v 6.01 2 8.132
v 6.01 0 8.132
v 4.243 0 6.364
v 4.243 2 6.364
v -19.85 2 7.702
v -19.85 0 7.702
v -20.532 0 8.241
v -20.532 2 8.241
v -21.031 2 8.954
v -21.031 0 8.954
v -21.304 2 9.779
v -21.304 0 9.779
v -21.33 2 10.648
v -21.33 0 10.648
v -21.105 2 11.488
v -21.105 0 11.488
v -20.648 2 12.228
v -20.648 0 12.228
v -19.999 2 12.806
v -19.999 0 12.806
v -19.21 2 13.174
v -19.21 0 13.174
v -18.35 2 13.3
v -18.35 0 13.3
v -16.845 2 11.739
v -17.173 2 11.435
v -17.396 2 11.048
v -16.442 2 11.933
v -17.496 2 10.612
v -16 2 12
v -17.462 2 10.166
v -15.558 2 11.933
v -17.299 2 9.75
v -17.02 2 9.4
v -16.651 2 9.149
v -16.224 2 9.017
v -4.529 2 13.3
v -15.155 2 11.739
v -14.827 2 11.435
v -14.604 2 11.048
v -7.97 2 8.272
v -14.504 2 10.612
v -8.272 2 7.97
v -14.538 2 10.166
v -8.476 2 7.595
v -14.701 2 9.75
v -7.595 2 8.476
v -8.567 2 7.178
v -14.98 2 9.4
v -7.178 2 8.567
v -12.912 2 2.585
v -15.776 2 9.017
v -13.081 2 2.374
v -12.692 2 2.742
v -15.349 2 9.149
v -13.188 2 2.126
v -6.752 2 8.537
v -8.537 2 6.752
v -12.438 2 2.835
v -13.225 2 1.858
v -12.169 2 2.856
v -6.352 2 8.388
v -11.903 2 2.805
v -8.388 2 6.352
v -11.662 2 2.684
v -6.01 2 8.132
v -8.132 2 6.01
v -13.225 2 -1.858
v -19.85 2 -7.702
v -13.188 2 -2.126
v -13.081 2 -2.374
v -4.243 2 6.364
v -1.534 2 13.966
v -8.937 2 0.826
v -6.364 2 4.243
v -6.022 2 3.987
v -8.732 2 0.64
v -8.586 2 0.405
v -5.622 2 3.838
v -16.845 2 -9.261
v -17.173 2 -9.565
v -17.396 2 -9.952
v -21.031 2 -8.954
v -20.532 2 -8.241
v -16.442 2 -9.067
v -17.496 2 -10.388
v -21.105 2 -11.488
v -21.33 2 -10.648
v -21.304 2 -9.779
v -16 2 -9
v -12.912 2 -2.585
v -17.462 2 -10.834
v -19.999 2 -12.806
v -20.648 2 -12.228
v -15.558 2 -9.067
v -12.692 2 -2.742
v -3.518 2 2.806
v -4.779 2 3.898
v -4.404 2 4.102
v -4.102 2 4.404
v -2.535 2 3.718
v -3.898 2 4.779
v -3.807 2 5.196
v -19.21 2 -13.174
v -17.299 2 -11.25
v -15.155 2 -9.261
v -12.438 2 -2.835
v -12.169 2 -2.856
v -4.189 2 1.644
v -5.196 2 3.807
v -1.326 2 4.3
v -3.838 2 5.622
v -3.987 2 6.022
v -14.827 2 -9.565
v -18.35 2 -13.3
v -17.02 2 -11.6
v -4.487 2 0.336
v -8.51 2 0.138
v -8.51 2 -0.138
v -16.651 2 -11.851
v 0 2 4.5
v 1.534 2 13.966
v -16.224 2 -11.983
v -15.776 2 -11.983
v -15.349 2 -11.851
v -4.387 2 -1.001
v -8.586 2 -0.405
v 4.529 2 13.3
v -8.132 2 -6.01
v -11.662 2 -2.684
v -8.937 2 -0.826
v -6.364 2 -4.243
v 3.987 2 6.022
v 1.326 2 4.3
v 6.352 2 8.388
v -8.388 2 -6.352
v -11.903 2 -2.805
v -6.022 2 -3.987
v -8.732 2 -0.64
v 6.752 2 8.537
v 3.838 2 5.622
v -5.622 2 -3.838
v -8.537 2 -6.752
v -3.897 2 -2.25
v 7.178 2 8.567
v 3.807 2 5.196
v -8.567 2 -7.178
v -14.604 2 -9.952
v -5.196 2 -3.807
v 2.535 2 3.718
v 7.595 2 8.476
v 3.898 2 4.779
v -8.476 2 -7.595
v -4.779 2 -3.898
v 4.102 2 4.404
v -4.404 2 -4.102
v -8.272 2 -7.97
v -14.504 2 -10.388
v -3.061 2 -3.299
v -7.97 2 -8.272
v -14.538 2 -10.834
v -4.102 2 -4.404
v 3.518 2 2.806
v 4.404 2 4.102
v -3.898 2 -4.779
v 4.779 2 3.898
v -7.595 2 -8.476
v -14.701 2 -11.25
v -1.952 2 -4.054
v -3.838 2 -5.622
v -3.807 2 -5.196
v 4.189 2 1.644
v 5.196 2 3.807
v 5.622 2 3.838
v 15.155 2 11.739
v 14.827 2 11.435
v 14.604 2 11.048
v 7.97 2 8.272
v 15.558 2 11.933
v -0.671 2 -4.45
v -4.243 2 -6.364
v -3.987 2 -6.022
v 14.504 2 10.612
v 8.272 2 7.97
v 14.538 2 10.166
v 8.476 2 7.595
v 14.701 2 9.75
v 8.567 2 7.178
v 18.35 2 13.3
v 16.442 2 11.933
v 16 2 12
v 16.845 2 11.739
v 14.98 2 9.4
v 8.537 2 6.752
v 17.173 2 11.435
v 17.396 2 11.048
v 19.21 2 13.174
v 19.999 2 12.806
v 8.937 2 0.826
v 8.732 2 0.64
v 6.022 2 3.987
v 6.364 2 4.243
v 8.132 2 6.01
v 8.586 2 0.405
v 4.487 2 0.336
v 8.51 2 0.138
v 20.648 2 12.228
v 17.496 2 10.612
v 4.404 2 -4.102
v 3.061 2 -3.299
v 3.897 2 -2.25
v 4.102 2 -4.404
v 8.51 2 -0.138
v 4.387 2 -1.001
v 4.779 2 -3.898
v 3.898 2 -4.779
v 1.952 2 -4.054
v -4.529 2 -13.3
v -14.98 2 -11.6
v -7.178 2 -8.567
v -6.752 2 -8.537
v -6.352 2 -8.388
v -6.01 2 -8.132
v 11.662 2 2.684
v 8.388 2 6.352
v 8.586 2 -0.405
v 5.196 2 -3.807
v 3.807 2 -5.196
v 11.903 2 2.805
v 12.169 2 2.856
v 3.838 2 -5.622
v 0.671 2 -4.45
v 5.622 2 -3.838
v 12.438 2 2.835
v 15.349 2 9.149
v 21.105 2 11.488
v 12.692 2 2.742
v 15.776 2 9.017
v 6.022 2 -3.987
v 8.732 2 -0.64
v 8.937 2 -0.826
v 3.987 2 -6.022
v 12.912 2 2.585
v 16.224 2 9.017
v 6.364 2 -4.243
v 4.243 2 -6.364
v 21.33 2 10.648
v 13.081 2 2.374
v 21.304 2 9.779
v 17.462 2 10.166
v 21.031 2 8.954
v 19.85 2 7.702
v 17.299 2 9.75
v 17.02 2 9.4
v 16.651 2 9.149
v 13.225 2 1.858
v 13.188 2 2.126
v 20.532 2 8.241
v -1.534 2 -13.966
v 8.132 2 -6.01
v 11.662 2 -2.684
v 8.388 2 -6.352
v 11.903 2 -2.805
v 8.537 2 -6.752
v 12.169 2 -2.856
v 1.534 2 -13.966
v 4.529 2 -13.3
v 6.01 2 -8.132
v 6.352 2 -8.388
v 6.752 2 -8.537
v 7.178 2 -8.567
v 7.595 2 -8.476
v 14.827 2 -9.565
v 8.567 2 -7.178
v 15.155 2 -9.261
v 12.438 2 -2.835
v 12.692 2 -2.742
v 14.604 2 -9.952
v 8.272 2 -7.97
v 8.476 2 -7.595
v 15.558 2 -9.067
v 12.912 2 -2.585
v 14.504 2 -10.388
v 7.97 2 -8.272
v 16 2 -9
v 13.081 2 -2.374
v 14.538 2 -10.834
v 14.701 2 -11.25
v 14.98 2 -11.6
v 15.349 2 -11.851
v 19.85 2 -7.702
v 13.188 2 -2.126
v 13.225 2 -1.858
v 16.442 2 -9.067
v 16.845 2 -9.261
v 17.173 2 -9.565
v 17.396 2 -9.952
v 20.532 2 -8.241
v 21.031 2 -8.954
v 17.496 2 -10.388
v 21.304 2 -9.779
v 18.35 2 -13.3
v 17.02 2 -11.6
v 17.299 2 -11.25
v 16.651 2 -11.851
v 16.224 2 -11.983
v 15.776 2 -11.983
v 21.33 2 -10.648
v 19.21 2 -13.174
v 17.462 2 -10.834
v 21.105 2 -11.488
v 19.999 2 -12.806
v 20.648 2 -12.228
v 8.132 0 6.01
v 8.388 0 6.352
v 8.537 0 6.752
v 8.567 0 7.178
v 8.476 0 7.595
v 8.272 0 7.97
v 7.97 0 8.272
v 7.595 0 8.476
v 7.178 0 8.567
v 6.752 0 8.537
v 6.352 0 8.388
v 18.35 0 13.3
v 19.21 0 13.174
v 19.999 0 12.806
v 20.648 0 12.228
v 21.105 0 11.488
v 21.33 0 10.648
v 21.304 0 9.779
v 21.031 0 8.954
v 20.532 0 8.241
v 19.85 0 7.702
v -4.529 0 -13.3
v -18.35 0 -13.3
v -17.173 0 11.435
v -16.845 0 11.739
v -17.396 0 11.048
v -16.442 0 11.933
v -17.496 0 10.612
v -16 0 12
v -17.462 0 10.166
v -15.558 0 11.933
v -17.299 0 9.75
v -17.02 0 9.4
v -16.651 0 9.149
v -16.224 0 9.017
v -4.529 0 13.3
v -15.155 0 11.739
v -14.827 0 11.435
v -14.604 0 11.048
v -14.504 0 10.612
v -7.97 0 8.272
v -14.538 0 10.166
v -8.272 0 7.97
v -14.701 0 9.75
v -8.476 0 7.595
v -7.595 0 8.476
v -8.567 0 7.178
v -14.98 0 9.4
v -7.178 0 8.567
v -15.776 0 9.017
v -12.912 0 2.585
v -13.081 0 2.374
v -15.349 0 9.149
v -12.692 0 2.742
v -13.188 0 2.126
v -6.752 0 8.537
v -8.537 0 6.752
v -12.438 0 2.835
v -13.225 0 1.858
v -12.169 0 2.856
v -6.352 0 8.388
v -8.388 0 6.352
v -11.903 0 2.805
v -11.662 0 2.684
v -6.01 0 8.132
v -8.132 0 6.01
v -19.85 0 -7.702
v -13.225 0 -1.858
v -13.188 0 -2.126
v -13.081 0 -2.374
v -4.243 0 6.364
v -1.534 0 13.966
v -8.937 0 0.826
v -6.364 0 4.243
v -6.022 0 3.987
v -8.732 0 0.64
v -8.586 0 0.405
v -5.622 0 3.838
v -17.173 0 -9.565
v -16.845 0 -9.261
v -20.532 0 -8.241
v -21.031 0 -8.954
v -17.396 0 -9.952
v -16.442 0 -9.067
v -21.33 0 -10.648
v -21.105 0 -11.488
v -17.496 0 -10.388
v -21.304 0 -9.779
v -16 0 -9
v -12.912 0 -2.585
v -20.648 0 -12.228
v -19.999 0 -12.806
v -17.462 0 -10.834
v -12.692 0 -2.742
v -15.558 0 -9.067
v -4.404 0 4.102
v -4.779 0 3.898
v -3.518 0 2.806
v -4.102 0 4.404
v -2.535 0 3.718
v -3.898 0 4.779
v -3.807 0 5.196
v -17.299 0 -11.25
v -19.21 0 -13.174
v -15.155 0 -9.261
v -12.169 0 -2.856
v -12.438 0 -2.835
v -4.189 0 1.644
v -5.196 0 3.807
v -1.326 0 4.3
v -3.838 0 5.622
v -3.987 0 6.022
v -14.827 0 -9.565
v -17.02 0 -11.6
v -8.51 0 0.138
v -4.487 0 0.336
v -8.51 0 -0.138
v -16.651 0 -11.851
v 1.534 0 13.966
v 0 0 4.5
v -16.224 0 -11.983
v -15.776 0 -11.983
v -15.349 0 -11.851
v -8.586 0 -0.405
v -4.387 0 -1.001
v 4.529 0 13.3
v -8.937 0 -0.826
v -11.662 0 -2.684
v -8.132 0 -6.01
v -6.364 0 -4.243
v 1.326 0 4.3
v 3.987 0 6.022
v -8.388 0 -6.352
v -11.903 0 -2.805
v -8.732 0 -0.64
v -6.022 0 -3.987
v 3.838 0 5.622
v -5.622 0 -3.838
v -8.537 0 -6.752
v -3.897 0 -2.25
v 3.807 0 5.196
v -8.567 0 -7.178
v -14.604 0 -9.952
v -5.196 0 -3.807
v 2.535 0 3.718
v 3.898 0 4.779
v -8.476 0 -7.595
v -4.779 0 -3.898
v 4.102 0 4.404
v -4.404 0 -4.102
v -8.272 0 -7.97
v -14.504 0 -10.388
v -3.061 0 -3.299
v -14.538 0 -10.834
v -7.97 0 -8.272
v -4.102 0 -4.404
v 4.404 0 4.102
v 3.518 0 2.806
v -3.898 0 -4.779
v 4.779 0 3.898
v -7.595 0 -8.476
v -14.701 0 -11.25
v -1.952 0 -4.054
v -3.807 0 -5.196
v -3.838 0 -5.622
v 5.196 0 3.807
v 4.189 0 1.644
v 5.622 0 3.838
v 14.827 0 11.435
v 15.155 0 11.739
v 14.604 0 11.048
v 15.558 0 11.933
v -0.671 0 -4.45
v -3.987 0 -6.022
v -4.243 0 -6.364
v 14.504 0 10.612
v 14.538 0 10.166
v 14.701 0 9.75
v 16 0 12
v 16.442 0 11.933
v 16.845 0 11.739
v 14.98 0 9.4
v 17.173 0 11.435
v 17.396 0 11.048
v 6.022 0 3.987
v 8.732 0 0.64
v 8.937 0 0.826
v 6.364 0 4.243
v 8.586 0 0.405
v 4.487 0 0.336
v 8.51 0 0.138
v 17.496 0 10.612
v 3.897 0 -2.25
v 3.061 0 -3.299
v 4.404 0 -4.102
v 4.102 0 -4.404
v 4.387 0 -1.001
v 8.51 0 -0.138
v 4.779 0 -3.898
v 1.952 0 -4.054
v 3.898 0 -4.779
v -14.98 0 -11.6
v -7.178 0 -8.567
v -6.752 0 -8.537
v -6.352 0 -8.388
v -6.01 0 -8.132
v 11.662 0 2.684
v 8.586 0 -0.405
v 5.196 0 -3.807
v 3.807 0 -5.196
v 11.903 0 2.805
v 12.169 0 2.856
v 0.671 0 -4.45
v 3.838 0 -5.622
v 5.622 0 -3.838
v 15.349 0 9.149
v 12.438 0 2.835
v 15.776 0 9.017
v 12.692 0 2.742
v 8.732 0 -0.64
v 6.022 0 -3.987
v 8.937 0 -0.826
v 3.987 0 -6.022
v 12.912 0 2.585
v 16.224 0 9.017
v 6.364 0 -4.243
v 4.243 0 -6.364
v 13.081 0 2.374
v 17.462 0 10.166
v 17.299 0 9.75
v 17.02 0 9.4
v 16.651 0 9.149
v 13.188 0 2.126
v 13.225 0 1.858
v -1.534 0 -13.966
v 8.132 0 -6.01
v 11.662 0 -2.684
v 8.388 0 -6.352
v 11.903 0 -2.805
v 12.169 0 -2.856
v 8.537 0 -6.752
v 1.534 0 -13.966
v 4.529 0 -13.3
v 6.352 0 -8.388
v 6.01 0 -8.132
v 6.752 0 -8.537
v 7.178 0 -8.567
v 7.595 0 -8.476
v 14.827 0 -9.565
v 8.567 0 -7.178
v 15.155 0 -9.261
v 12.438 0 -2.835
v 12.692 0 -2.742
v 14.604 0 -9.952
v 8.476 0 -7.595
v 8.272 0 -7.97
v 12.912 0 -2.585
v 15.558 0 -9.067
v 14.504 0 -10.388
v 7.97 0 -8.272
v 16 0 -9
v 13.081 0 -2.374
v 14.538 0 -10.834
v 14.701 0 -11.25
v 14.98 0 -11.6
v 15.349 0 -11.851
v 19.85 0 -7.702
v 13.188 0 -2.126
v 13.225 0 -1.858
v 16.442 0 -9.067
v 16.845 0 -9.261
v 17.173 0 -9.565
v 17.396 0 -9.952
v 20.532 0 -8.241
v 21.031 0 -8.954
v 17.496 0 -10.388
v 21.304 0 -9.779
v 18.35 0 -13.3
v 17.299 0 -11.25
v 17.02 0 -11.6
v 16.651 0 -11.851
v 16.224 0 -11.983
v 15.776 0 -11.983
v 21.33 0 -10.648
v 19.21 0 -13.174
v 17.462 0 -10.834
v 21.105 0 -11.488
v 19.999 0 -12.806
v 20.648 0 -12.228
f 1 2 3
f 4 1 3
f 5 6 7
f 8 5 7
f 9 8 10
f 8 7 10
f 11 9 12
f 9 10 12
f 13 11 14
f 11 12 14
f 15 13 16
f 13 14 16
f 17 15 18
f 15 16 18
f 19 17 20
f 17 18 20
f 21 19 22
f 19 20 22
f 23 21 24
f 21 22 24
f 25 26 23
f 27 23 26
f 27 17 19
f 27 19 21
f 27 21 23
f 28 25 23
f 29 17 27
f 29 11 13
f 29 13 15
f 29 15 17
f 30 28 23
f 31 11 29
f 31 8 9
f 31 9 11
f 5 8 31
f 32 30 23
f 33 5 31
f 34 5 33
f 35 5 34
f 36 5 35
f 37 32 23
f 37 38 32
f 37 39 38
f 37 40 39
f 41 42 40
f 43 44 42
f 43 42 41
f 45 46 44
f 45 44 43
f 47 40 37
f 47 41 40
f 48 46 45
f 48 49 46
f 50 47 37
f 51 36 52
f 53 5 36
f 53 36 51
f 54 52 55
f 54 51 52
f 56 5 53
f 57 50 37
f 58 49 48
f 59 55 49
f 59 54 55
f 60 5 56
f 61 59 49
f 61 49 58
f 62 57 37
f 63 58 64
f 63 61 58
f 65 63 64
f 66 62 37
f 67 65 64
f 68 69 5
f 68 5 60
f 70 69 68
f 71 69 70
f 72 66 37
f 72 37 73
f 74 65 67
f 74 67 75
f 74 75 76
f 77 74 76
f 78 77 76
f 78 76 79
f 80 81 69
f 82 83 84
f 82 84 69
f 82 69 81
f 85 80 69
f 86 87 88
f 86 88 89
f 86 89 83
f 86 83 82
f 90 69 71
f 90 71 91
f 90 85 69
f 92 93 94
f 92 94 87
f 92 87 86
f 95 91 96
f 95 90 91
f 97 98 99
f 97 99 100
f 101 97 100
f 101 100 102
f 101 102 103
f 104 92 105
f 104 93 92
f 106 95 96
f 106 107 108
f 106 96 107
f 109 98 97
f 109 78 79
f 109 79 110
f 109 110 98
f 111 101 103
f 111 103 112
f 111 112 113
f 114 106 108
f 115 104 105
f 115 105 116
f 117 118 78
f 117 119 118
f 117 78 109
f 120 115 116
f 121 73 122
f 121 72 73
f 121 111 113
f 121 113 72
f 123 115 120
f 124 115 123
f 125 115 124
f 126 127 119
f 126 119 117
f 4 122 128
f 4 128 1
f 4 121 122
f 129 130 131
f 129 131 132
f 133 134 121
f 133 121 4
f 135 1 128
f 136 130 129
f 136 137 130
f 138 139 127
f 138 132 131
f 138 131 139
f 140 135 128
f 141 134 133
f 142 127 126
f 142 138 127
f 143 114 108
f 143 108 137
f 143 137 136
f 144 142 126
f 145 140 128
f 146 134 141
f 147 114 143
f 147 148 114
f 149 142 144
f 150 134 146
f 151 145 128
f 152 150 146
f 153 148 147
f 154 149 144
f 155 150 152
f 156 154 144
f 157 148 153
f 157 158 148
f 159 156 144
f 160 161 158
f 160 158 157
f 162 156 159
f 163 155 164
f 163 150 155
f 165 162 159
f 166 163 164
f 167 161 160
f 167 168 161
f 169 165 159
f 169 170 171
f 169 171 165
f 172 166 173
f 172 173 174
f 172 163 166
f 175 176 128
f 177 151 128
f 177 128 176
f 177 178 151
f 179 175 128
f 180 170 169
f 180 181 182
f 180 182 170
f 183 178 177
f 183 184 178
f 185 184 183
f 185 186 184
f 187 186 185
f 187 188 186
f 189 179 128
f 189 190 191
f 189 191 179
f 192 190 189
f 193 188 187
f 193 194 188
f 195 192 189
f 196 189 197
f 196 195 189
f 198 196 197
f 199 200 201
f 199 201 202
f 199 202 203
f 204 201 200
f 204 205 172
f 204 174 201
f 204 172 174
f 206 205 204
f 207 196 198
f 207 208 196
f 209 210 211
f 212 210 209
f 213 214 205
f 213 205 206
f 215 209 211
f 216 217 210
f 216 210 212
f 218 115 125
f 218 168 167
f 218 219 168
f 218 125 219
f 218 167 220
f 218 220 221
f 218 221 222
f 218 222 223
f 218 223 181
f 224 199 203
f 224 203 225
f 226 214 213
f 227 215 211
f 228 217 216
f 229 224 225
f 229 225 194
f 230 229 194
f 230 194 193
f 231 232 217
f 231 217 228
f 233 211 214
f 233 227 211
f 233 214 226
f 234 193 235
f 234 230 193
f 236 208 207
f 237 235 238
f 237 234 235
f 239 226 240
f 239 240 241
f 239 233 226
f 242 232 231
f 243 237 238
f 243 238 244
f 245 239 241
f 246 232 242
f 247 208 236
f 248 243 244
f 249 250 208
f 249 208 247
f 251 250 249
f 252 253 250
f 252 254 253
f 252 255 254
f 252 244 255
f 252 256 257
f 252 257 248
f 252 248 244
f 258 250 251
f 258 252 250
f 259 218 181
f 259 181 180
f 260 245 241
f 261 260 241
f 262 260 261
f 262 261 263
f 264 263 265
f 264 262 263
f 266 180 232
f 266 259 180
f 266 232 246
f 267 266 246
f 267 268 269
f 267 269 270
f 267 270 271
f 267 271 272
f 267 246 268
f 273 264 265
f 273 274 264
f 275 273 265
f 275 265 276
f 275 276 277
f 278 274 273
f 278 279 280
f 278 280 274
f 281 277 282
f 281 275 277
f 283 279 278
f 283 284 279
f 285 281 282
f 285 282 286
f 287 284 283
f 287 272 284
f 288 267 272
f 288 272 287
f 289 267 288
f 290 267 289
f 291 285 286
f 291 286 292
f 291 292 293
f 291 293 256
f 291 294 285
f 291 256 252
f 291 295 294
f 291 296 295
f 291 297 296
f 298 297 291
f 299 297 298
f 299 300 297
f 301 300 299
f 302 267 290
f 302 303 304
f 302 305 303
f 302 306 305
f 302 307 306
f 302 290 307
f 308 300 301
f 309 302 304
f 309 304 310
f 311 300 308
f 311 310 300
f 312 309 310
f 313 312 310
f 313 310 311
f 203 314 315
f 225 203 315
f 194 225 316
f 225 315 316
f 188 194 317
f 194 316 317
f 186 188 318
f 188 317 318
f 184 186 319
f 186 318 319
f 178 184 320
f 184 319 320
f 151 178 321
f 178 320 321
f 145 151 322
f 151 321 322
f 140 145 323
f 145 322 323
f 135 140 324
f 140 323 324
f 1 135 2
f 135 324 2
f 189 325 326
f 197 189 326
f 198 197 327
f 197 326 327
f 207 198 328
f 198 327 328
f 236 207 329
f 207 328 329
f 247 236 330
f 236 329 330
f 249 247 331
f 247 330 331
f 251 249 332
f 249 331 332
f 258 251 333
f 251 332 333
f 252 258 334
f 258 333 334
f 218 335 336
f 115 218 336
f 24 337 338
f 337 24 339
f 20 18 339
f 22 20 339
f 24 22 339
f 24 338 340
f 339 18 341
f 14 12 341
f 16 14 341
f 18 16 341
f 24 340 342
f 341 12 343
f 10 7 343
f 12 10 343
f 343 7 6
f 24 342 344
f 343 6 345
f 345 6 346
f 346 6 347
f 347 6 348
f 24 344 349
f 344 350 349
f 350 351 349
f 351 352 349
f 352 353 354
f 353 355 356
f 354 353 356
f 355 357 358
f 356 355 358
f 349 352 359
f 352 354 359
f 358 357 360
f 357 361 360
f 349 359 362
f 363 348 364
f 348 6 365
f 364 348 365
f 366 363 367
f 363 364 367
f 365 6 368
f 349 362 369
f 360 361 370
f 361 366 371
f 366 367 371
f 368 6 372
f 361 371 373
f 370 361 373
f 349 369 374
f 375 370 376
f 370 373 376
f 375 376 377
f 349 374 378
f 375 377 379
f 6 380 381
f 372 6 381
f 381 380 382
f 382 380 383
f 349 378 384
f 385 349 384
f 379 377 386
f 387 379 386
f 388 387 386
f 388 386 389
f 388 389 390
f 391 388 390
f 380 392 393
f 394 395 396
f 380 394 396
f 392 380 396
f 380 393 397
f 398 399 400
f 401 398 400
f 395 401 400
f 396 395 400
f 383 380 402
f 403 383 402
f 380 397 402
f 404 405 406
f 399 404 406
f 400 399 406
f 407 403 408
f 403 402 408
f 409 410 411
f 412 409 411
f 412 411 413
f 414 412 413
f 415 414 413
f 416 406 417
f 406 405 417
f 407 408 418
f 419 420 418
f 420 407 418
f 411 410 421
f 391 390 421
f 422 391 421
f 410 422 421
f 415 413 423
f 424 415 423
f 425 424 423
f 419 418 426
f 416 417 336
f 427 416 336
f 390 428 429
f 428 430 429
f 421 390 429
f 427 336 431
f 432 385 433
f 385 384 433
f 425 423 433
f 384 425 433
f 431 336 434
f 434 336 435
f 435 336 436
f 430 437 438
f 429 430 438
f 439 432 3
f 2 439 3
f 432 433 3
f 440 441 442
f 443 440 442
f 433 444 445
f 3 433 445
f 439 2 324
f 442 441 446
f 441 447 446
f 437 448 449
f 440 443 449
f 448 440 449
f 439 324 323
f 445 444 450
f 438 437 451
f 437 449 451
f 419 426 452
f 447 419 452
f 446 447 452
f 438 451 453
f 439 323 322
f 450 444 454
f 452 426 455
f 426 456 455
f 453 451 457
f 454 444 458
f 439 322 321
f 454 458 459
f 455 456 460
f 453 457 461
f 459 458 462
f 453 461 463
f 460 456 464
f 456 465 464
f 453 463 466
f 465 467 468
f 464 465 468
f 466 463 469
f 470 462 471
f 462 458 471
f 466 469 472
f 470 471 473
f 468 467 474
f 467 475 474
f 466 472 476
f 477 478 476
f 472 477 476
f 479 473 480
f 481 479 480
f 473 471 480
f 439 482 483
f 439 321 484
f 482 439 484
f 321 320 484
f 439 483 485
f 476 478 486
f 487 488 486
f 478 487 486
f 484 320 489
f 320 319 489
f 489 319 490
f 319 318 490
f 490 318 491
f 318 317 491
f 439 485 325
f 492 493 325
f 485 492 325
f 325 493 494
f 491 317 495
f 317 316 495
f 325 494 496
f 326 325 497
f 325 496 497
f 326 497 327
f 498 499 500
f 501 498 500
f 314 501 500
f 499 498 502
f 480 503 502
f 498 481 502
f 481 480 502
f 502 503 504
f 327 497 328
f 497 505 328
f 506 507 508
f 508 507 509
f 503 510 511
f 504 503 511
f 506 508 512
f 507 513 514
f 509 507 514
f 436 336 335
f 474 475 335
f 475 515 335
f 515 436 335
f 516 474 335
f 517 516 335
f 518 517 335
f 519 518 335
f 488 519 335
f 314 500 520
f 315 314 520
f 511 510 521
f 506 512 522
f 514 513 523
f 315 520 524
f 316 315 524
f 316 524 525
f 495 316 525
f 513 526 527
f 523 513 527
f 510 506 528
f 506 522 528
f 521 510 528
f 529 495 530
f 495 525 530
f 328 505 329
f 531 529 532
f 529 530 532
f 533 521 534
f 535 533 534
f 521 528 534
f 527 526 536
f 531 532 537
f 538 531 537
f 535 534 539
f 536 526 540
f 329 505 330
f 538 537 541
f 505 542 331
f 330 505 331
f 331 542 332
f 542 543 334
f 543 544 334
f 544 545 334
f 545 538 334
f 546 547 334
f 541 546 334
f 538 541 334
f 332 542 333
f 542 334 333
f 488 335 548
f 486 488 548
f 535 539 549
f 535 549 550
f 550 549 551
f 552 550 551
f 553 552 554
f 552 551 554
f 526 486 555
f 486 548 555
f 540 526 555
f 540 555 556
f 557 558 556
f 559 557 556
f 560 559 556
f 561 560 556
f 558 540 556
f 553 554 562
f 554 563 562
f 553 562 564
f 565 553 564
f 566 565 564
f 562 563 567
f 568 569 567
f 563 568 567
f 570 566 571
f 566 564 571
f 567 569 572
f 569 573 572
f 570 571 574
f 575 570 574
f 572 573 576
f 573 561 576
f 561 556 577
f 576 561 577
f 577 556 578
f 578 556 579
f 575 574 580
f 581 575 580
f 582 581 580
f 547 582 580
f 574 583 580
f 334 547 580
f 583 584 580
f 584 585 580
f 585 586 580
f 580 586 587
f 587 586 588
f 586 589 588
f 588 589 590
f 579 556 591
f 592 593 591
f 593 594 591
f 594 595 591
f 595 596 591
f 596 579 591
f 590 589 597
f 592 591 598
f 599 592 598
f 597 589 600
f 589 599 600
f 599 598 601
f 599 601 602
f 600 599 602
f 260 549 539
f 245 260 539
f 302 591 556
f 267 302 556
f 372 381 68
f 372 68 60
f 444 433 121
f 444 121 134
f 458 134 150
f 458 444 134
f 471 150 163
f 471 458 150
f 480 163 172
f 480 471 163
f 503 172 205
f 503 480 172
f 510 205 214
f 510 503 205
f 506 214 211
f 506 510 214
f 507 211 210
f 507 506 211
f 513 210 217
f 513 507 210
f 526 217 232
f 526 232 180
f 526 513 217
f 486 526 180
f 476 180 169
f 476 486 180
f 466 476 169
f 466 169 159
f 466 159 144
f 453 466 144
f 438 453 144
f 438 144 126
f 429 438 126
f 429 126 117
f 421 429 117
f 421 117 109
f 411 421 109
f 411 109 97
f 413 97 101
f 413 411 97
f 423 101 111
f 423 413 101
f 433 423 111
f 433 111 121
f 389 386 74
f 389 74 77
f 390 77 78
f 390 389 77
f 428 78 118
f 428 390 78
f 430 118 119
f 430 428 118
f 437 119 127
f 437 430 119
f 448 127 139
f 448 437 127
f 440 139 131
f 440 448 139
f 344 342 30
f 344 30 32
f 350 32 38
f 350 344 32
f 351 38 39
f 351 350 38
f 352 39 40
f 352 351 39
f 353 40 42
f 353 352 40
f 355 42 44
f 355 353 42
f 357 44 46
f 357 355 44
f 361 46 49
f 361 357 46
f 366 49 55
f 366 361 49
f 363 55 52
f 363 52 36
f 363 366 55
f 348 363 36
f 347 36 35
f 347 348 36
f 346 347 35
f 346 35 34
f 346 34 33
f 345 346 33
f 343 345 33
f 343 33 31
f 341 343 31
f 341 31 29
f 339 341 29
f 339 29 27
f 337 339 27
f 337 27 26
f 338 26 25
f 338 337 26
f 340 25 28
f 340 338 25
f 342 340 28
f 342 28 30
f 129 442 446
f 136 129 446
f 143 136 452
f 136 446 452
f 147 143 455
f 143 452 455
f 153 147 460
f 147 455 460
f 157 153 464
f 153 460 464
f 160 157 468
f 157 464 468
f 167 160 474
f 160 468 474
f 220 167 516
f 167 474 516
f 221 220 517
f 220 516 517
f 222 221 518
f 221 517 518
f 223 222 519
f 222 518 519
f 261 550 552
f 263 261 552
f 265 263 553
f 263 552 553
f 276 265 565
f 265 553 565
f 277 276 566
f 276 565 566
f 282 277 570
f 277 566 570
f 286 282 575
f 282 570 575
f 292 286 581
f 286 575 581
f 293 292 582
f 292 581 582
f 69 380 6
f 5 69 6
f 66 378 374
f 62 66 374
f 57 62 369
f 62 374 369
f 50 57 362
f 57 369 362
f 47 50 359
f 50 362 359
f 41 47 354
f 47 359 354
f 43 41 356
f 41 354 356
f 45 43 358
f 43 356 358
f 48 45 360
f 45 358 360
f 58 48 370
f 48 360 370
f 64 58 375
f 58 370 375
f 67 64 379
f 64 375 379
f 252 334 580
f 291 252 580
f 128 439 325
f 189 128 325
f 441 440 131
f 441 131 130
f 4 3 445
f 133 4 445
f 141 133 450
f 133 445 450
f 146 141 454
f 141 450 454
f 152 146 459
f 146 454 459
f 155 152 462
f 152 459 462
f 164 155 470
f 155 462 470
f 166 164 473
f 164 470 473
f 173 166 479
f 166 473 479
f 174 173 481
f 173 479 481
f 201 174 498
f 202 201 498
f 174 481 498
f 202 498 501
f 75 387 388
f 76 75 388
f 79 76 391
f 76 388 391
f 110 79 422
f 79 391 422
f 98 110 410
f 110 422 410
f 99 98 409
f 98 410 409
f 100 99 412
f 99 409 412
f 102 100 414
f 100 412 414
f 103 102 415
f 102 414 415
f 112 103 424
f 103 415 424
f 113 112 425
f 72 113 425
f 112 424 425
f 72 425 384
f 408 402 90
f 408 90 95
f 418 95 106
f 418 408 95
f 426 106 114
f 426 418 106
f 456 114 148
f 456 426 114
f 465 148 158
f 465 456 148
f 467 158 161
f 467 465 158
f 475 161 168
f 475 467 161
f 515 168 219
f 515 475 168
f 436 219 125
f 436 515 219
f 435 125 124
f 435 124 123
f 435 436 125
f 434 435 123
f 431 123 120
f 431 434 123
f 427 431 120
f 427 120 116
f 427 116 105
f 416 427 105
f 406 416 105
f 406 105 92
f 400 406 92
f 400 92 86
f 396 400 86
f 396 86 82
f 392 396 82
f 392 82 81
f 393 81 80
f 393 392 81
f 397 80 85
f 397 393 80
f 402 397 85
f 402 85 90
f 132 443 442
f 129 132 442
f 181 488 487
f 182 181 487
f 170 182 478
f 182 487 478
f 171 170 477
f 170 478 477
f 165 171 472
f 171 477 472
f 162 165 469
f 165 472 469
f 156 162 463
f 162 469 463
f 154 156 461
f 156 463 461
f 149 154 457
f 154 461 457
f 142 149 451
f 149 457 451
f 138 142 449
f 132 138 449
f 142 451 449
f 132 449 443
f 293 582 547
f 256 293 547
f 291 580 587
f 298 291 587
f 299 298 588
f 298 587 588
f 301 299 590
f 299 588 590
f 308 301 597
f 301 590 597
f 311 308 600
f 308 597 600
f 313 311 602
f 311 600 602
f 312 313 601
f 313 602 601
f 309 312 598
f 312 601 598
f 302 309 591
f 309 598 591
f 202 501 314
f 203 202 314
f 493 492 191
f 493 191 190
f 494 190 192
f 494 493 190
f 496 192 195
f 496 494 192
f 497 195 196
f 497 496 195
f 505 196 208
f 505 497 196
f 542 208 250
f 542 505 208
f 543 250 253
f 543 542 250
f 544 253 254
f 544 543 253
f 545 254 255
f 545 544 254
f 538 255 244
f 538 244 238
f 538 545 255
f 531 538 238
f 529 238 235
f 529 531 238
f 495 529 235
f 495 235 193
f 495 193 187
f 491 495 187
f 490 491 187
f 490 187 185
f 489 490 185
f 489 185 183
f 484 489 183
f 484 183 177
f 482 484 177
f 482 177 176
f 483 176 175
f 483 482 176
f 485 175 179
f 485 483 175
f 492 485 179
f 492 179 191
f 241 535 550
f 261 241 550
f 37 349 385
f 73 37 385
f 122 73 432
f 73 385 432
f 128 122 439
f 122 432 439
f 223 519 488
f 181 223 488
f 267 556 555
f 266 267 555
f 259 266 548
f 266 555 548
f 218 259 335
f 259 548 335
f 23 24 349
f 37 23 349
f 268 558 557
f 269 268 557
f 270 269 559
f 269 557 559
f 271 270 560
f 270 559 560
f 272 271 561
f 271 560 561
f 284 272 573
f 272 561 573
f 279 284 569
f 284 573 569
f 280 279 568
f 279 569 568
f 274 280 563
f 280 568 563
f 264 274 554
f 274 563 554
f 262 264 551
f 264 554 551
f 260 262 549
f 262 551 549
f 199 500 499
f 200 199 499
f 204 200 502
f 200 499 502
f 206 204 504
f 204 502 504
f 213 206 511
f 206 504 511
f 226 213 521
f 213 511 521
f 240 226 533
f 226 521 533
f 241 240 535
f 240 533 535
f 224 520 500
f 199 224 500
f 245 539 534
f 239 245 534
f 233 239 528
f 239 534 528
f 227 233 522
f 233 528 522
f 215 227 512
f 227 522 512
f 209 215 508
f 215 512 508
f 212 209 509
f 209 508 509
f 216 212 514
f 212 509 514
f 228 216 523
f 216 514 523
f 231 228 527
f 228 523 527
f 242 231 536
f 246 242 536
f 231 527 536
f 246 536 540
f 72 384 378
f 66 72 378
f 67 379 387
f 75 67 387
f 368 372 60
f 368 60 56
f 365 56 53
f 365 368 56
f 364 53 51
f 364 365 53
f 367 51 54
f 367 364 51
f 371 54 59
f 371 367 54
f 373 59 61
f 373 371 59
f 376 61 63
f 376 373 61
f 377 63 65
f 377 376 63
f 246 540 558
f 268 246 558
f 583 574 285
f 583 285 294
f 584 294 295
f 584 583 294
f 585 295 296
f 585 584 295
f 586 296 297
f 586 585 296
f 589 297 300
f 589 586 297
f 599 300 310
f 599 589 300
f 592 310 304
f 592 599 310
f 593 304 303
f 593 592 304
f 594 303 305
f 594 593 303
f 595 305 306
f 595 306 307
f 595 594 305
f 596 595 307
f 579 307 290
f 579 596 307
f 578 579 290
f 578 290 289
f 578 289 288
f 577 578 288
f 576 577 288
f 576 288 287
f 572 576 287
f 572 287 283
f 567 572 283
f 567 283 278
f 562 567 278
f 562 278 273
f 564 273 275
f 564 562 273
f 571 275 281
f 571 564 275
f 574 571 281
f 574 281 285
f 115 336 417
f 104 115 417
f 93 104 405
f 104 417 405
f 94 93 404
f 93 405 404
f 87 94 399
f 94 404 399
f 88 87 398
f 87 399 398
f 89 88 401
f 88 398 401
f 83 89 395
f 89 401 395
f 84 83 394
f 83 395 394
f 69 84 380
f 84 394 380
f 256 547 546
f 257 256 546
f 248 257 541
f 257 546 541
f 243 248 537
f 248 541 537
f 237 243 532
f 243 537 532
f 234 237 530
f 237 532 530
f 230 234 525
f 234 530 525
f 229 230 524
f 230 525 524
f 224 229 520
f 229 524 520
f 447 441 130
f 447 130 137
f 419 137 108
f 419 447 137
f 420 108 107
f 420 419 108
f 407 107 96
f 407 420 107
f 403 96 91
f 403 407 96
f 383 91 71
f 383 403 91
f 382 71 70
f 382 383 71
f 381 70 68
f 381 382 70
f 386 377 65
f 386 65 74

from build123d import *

# Parameters (mm, degrees)
SKETCH1_R           = 1.5
SKETCH1_R_2         = 4.5
BOSS_EXTRUDE1_DEPTH = 2


with BuildPart() as part:
    # Sketch1 → Boss-Extrude1 (new body)
    with BuildSketch(Plane(origin=(0, 0, 0), x_dir=(1, 0, 0), z_dir=(0, 1, 0))):
        with BuildLine():
            Line((-18.35, -13.3), (-4.529072753, -13.3))
            ThreePointArc((-4.529072753, -13.3), (0, -14.05), (4.529072753, -13.3))
            Line((4.529072753, -13.3), (18.35, -13.3))
            ThreePointArc((18.35, -13.3), (21.247777479, -11.076457135), (19.85, -7.701923789))
            Line((19.85, -7.701923789), (19.85, 7.701923789))
            ThreePointArc((19.85, 7.701923789), (21.247777479, 11.076457135), (18.35, 13.3))
            Line((18.35, 13.3), (4.529072753, 13.3))
            ThreePointArc((4.529072753, 13.3), (0, 14.05), (-4.529072753, 13.3))
            Line((-4.529072753, 13.3), (-18.35, 13.3))
            ThreePointArc((-18.35, 13.3), (-21.247777479, 11.076457135), (-19.85, 7.701923789))
            Line((-19.85, 7.701923789), (-19.85, -7.701923789))
            ThreePointArc((-19.85, -7.701923789), (-21.247777479, -11.076457135), (-18.35, -13.3))
        make_face()
        with Locations(Location((-16, 10.5, 0), (0, 0, 270))):
            Circle(SKETCH1_R, mode=Mode.SUBTRACT)
        with Locations(Location((-16, -10.5, 0), (0, 0, 270))):
            Circle(SKETCH1_R, mode=Mode.SUBTRACT)
        with Locations(Location((16, -10.5, 0), (0, 0, 270))):
            Circle(SKETCH1_R, mode=Mode.SUBTRACT)
        with Locations(Location((16, 10.5, 0), (0, 0, 270))):
            Circle(SKETCH1_R, mode=Mode.SUBTRACT)
        with Locations(Location((0, 0, 0), (0, 0, 270))):
            Circle(SKETCH1_R_2, mode=Mode.SUBTRACT)
        with BuildLine():
            Line((-6.01040764, 8.131727984), (-4.242640687, 6.363961031))
            ThreePointArc((-4.242640687, 6.363961031), (-4.242640687, 4.242640687), (-6.363961031, 4.242640687))
            Line((-6.363961031, 4.242640687), (-8.131727984, 6.01040764))
            ThreePointArc((-8.131727984, 6.01040764), (-8.131727984, 8.131727984), (-6.01040764, 8.131727984))
        make_face(mode=Mode.SUBTRACT)
        with BuildLine():
            Line((8.131727984, 6.01040764), (6.363961031, 4.242640687))
            ThreePointArc((6.363961031, 4.242640687), (4.242640687, 4.242640687), (4.242640687, 6.363961031))
            Line((4.242640687, 6.363961031), (6.01040764, 8.131727984))
            ThreePointArc((6.01040764, 8.131727984), (8.131727984, 8.131727984), (8.131727984, 6.01040764))
        make_face(mode=Mode.SUBTRACT)
        with BuildLine():
            Line((6.01040764, -8.131727984), (4.242640687, -6.363961031))
            ThreePointArc((4.242640687, -6.363961031), (4.242640687, -4.242640687), (6.363961031, -4.242640687))
            Line((6.363961031, -4.242640687), (8.131727984, -6.01040764))
            ThreePointArc((8.131727984, -6.01040764), (8.131727984, -8.131727984), (6.01040764, -8.131727984))
        make_face(mode=Mode.SUBTRACT)
        with BuildLine():
            Line((-8.131727984, -6.01040764), (-6.363961031, -4.242640687))
            ThreePointArc((-6.363961031, -4.242640687), (-4.242640687, -4.242640687), (-4.242640687, -6.363961031))
            Line((-4.242640687, -6.363961031), (-6.01040764, -8.131727984))
            ThreePointArc((-6.01040764, -8.131727984), (-8.131727984, -8.131727984), (-8.131727984, -6.01040764))
        make_face(mode=Mode.SUBTRACT)
        with BuildLine():
            Line((-13.224863073, 1.857861186), (-13.224863073, -1.857861186))
            ThreePointArc((-13.224863073, -1.857861186), (-12.69212273, -2.74198132), (-11.661526248, -2.684088529))
            Line((-11.661526248, -2.684088529), (-8.936663175, -0.826227343))
            ThreePointArc((-8.936663175, -0.826227343), (-8.5, 0), (-8.936663175, 0.826227343))
            Line((-8.936663175, 0.826227343), (-11.661526248, 2.684088529))
            ThreePointArc((-11.661526248, 2.684088529), (-12.69212273, 2.74198132), (-13.224863073, 1.857861186))
        make_face(mode=Mode.SUBTRACT)
        with BuildLine():
            Line((11.661526248, -2.684088529), (8.936663175, -0.826227343))
            ThreePointArc((8.936663175, -0.826227343), (8.5, 0), (8.936663175, 0.826227343))
            Line((8.936663175, 0.826227343), (11.661526248, 2.684088529))
            ThreePointArc((11.661526248, 2.684088529), (12.69212273, 2.74198132), (13.224863073, 1.857861186))
            Line((13.224863073, 1.857861186), (13.224863073, -1.857861186))
            ThreePointArc((13.224863073, -1.857861186), (12.69212273, -2.74198132), (11.661526248, -2.684088529))
        make_face(mode=Mode.SUBTRACT)
    extrude(amount=BOSS_EXTRUDE1_DEPTH)


solid = part.part
